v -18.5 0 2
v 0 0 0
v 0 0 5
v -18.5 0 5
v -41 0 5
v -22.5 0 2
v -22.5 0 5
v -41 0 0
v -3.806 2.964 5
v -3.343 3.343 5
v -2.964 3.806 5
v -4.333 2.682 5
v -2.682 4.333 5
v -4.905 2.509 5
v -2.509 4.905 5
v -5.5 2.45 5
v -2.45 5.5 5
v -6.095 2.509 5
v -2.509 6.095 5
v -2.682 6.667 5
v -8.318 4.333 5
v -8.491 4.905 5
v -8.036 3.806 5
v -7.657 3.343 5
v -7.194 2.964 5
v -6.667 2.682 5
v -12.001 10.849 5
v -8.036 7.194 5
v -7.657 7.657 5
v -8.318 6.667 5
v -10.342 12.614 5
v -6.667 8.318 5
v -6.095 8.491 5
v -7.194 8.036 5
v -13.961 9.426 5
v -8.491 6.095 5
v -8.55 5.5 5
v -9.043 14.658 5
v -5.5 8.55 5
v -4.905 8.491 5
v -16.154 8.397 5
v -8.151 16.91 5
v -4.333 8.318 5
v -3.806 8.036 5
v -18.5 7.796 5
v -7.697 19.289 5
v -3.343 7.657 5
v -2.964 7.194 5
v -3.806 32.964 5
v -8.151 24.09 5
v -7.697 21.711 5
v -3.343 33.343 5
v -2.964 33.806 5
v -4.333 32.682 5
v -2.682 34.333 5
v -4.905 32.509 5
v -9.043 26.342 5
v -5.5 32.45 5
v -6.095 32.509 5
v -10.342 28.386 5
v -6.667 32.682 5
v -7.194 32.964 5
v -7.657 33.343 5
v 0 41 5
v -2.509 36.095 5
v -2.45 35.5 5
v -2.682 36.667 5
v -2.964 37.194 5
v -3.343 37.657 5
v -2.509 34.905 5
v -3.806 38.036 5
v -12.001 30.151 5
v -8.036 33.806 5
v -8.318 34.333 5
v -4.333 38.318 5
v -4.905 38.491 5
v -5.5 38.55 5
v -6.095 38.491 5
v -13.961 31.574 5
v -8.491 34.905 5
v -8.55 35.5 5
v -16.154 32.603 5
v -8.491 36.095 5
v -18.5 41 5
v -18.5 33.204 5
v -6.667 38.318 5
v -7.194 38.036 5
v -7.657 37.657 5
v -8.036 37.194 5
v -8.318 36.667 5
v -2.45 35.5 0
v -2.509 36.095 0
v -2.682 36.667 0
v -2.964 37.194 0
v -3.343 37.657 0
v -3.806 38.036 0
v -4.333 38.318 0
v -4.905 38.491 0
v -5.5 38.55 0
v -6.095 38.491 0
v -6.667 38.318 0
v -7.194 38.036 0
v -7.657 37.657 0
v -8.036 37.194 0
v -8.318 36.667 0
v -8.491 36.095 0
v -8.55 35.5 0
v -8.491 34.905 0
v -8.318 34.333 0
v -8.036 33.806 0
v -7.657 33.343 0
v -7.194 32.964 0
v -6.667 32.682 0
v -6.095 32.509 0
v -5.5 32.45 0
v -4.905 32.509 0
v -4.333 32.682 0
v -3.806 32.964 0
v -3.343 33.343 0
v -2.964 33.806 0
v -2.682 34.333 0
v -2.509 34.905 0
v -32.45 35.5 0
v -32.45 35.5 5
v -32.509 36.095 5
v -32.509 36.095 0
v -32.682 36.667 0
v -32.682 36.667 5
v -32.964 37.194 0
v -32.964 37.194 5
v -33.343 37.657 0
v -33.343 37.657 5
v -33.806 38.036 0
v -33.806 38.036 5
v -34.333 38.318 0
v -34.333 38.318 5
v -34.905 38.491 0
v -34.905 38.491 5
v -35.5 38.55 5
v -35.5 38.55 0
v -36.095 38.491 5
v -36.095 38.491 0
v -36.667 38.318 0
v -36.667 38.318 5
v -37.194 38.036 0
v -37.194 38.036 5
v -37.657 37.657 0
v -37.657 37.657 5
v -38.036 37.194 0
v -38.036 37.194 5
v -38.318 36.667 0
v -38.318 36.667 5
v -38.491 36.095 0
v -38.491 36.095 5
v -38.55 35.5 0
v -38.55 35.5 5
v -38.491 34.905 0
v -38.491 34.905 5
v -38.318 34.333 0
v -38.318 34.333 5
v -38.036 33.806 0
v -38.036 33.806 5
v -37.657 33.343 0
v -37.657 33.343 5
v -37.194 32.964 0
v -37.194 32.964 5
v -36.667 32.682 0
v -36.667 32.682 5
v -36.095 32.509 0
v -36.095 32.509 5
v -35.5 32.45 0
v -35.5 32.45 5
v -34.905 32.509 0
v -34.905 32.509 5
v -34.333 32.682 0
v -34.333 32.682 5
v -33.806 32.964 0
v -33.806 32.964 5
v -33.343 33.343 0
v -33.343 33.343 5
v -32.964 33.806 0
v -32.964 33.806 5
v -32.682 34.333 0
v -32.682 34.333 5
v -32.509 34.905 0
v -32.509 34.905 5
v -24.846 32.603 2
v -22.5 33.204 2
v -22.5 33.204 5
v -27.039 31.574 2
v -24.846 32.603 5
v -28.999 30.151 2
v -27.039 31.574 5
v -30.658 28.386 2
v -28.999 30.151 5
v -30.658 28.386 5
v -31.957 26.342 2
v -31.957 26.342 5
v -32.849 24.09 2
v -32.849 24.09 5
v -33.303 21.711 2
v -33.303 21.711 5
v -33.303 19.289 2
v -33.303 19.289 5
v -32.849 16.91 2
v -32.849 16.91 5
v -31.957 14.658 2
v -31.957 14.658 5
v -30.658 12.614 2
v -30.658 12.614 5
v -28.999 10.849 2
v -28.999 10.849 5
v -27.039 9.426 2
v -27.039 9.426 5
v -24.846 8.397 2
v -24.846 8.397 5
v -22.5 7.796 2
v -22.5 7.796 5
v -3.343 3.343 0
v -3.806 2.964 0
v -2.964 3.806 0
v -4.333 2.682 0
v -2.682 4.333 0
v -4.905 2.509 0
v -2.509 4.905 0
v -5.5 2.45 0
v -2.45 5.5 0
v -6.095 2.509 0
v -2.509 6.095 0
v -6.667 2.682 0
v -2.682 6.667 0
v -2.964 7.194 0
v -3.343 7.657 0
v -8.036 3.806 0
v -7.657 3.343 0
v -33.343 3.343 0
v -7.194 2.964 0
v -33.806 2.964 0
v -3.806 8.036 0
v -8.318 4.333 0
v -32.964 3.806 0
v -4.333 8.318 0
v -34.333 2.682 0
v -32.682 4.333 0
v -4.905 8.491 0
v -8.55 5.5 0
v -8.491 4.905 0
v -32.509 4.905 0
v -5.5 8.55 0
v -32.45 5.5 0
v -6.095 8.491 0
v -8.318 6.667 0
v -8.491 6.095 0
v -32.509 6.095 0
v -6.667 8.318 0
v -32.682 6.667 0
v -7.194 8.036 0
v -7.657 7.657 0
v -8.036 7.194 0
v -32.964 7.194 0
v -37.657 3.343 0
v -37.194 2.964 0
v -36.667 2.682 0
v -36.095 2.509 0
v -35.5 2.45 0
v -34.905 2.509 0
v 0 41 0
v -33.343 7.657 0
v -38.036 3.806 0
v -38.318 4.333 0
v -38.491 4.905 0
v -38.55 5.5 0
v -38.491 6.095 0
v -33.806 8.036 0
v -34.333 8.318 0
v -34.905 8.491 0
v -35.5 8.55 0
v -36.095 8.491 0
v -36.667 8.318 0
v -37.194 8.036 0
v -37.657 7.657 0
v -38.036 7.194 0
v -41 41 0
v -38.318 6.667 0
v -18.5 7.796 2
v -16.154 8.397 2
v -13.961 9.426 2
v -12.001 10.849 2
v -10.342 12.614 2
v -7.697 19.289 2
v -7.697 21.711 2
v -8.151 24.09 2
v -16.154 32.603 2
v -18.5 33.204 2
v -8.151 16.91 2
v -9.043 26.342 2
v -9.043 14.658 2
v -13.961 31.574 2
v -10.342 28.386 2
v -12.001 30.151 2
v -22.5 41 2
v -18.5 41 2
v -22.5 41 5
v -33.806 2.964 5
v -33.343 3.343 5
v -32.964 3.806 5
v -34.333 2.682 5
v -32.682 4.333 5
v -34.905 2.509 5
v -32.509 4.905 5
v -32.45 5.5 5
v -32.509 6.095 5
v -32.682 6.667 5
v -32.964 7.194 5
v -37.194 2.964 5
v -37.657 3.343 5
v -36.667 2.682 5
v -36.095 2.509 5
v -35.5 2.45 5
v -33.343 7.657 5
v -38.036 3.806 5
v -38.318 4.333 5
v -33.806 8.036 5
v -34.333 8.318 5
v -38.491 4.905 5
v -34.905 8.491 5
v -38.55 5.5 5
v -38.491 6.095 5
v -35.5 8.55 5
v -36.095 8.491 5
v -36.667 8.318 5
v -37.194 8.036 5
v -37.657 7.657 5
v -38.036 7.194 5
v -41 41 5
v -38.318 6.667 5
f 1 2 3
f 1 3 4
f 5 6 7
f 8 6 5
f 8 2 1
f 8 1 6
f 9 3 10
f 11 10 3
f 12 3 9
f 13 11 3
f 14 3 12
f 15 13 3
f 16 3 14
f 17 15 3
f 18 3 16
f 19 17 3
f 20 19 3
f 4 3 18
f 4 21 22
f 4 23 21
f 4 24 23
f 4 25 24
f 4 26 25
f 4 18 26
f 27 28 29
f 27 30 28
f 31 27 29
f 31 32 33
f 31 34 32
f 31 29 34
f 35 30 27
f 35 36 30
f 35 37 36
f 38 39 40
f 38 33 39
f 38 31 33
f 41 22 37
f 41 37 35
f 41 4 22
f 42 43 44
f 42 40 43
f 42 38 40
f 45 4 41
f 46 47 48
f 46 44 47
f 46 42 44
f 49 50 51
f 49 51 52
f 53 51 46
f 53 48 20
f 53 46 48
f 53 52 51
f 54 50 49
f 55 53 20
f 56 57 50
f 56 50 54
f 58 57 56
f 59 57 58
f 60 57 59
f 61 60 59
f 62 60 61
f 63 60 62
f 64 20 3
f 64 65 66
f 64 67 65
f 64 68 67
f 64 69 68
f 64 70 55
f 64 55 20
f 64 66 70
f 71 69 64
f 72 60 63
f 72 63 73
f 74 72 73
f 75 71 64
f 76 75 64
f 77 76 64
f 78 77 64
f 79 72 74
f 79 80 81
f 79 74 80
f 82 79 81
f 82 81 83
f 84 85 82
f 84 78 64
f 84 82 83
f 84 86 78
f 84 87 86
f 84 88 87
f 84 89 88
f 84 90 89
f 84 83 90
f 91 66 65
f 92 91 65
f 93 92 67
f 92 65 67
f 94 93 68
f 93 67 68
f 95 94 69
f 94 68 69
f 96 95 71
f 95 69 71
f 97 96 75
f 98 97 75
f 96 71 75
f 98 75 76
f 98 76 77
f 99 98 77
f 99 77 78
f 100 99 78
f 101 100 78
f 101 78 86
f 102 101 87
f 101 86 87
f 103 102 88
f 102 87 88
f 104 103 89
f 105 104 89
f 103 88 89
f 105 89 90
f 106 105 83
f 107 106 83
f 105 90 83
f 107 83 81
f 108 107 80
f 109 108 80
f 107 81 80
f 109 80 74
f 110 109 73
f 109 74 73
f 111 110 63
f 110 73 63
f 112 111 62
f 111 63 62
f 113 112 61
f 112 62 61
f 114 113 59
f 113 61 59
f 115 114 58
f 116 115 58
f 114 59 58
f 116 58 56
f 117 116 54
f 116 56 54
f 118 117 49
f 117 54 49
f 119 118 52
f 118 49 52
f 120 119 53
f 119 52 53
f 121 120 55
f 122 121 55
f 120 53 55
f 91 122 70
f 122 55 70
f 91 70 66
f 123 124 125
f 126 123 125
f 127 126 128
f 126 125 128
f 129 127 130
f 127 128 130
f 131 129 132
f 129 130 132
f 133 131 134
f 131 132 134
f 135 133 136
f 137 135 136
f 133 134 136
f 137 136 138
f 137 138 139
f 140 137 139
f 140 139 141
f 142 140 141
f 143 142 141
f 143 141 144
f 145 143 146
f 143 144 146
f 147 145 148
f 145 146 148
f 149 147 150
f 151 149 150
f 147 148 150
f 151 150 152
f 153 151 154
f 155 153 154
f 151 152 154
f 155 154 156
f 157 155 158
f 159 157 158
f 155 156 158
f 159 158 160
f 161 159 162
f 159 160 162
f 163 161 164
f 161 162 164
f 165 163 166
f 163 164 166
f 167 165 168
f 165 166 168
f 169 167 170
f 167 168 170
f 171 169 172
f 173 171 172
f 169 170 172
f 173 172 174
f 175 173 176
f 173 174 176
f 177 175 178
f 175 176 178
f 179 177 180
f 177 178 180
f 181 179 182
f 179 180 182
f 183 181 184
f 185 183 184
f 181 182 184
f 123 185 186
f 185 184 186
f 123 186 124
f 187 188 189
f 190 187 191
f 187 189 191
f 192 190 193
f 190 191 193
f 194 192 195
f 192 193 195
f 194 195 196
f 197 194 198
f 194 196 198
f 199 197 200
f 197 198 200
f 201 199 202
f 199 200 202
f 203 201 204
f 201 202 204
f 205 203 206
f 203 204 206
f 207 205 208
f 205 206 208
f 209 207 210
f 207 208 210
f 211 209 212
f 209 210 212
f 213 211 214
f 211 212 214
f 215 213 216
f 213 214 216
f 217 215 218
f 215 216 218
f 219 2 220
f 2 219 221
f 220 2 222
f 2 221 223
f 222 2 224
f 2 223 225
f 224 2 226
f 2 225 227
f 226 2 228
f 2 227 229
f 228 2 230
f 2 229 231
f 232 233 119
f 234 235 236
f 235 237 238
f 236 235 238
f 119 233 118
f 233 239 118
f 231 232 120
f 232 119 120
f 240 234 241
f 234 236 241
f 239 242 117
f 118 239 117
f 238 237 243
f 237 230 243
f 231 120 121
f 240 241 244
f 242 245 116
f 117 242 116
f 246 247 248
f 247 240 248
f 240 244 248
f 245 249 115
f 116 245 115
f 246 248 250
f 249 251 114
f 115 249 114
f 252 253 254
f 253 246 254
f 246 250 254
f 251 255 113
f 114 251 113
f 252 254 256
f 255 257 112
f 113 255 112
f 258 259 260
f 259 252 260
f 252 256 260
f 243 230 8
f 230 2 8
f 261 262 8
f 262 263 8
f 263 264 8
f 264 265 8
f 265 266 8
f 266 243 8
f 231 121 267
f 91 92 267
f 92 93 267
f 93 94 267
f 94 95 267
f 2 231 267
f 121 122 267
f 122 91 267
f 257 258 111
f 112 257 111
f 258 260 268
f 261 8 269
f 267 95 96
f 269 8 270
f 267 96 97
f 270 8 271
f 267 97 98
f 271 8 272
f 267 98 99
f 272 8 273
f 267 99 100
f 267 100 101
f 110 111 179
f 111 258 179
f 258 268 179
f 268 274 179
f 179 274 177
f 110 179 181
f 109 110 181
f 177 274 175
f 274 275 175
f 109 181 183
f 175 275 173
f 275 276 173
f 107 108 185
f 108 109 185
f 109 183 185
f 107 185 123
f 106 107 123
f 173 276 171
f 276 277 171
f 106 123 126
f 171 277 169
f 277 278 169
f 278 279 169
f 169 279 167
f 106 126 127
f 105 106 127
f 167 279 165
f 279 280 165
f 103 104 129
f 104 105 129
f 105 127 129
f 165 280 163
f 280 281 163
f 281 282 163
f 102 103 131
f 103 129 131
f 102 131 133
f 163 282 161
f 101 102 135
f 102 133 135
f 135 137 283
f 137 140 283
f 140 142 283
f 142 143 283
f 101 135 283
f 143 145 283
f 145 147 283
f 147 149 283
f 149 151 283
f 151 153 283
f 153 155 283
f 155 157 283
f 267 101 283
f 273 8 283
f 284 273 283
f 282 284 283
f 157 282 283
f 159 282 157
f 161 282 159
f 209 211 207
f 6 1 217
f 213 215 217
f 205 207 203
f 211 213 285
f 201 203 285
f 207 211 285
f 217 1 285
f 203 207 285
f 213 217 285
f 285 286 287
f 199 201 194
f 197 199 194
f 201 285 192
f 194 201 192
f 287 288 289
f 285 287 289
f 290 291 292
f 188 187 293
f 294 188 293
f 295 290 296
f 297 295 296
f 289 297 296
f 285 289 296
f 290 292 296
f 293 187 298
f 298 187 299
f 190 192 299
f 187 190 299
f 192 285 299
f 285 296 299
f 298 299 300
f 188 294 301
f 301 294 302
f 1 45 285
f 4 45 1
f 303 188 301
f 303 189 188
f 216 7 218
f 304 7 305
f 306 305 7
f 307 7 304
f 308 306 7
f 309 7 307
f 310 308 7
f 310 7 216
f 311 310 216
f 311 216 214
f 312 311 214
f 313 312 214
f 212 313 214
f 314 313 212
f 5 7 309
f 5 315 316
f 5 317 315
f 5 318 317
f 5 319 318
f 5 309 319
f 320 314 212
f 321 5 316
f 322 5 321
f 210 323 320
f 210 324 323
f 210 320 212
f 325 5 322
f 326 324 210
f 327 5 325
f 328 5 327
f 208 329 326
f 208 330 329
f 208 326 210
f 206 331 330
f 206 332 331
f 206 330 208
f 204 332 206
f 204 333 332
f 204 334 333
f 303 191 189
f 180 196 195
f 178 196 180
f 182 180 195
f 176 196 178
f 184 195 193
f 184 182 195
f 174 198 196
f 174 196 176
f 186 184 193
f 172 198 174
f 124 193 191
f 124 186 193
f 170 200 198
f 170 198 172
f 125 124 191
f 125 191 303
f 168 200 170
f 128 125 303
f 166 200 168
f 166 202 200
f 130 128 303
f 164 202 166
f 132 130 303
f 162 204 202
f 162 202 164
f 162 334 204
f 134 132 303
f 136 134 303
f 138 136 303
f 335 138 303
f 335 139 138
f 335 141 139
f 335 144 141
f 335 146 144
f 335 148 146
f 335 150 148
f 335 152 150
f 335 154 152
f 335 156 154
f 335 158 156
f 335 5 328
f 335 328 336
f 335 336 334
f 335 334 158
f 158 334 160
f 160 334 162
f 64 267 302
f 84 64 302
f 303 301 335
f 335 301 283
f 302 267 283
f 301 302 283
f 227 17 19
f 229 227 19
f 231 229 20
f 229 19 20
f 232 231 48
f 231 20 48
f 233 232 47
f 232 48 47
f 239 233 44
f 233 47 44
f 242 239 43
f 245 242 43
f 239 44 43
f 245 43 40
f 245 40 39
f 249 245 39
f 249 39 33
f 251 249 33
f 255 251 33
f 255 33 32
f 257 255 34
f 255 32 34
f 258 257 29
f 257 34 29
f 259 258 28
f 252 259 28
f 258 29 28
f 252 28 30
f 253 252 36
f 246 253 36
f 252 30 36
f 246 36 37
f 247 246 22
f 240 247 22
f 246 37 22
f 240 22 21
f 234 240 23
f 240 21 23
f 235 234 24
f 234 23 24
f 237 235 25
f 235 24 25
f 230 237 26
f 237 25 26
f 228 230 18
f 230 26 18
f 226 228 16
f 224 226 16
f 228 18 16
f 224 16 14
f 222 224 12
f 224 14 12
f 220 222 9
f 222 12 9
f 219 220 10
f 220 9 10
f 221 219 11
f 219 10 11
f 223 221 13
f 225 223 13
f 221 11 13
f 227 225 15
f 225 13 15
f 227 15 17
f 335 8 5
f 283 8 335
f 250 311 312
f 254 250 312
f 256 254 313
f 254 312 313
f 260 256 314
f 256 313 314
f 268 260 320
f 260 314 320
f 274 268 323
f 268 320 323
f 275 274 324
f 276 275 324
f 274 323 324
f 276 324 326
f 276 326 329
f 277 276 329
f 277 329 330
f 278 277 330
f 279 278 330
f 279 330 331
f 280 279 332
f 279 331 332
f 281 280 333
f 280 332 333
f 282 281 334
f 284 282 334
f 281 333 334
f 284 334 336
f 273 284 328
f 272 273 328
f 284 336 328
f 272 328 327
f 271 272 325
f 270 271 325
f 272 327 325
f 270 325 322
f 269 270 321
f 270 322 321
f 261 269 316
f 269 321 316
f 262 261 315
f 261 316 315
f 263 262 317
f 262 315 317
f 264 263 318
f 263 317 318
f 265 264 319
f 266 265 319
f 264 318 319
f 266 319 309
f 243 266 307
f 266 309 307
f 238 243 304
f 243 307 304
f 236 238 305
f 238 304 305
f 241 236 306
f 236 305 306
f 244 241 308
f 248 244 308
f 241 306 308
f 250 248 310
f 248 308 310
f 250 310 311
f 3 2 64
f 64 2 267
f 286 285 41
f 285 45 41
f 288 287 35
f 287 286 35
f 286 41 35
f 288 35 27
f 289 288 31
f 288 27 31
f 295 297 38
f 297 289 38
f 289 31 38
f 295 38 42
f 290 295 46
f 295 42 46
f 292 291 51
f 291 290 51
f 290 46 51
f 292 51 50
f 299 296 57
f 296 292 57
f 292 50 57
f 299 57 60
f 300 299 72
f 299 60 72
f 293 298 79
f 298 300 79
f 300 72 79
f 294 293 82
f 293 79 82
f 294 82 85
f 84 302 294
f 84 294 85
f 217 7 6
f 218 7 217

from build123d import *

# Parameters (mm, degrees)
CROQUIS1_W             = 41
CROQUIS1_H             = 41
PLAQUEBASE_DEPTH       = 5
CROQUIS2_R             = 12.86
CERCLECENTRAL_DEPTH    = 3
CROQUIS3_R             = 3.05
SUPPORT_DEPTH          = 5
CROQUIS4_W             = 3
CROQUIS4_H             = 2.5
TROUSLAT_DEPTH         = 41
CORTAR_EXTRUIR1_DEPTH  = 0.5
CORTAR_EXTRUIR2_DEPTH  = 0.5
CROQUIS15_W            = 7.727780146
CROQUIS15_H            = 3
CORTAR_EXTRUIR3_DEPTH  = 0.5
CROQUIS16_W            = 7.727780146
CROQUIS16_H            = 3
CORTAR_EXTRUIR4_DEPTH  = 0.5
CROQUIS17_W            = 7.727780146
CROQUIS17_H            = 3
CORTAR_EXTRUIR5_DEPTH  = 0.5
CROQUIS18_W            = 7.727780146
CROQUIS18_H            = 3
CORTAR_EXTRUIR6_DEPTH  = 0.5
CROQUIS19_W            = 0.5
CROQUIS19_H            = 3
CORTAR_EXTRUIR7_DEPTH  = 0.5
CROQUIS20_W            = 0.5
CROQUIS20_H            = 3
CORTAR_EXTRUIR8_DEPTH  = 0.5
CROQUIS21_W            = 0.5
CROQUIS21_H            = 3
CORTAR_EXTRUIR9_DEPTH  = 0.5
CROQUIS22_W            = 0.5
CROQUIS22_H            = 3
CORTAR_EXTRUIR10_DEPTH = 0.5


with BuildPart() as part:
    # Croquis1 → PlaqueBase (new body)
    with BuildSketch(Plane(origin=(0, 0, 0), x_dir=(0, 1, 0), z_dir=(0, 0, 1))):
        with Locations((20.5, 20.5)):
            Rectangle(CROQUIS1_W, CROQUIS1_H)
    extrude(amount=PLAQUEBASE_DEPTH)

    # Croquis2 → CercleCentral (cut)
    with BuildSketch(Plane.XY.offset(5)):
        with Locations((-20.5, 20.5)):
            Circle(CROQUIS2_R)
    extrude(amount=-CERCLECENTRAL_DEPTH, mode=Mode.SUBTRACT)

    # Croquis3 → Support (cut)
    with BuildSketch(Plane.XY.offset(5)):
        with Locations((-35.5, 5.5)):
            Circle(CROQUIS3_R)
        with Locations((-5.5, 5.5)):
            Circle(CROQUIS3_R)
        with Locations((-5.5, 35.5)):
            Circle(CROQUIS3_R)
        with Locations((-35.5, 35.5)):
            Circle(CROQUIS3_R)
    extrude(amount=-SUPPORT_DEPTH, mode=Mode.SUBTRACT)

    # Croquis4 → TrousLat (cut)
    with BuildSketch(Plane(origin=(0, 0, 0), x_dir=(-1, 0, 0), z_dir=(0, -1, 0))):
        with Locations((20.5, -3.75)):
            Rectangle(CROQUIS4_W, CROQUIS4_H)
    extrude(amount=-TROUSLAT_DEPTH, mode=Mode.SUBTRACT)

    # Croquis6 → Cortar-Extruir1 (cut)
    with BuildSketch(Plane.XY.offset(2.5)):
        with BuildLine():
            Line((-19, 33.272219854), (-19, 41))
            Line((-19, 41), (-22, 41))
            Line((-22, 41), (-22, 33.272219854))
            ThreePointArc((-22, 33.272219854), (-20.5, 33.36), (-19, 33.272219854))
        make_face()
    extrude(amount=-CORTAR_EXTRUIR1_DEPTH, mode=Mode.SUBTRACT)

    # Croquis14 → Cortar-Extruir2 (cut)
    with BuildSketch(Plane.XY.offset(2.5)):
        with BuildLine():
            Line((-22, 7.727780146), (-22, 0))
            Line((-22, 0), (-19, 0))
            Line((-19, 0), (-19, 7.727780146))
            ThreePointArc((-19, 7.727780146), (-20.5, 7.64), (-22, 7.727780146))
        make_face()
    extrude(amount=-CORTAR_EXTRUIR2_DEPTH, mode=Mode.SUBTRACT)

    # Croquis15 → Cortar-Extruir3 (cut)
    with BuildSketch(Plane(origin=(-19, 0, 0), x_dir=(0, -1, 0), z_dir=(-1, 0, 0))):
        with Locations((-37.136109927, 3.5)):
            Rectangle(CROQUIS15_W, CROQUIS15_H)
    extrude(amount=-CORTAR_EXTRUIR3_DEPTH, mode=Mode.SUBTRACT)

    # Croquis16 → Cortar-Extruir4 (cut)
    with BuildSketch(Plane(origin=(-19, 0, 0), x_dir=(0, -1, 0), z_dir=(-1, 0, 0))):
        with Locations((-3.863890073, 3.5)):
            Rectangle(CROQUIS16_W, CROQUIS16_H)
    extrude(amount=-CORTAR_EXTRUIR4_DEPTH, mode=Mode.SUBTRACT)

    # Croquis17 → Cortar-Extruir5 (cut)
    with BuildSketch(Plane.YZ.offset(-22)):
        with Locations((3.863890073, 3.5)):
            Rectangle(CROQUIS17_W, CROQUIS17_H)
    extrude(amount=-CORTAR_EXTRUIR5_DEPTH, mode=Mode.SUBTRACT)

    # Croquis18 → Cortar-Extruir6 (cut)
    with BuildSketch(Plane.YZ.offset(-22)):
        with Locations((37.136109927, 3.5)):
            Rectangle(CROQUIS18_W, CROQUIS18_H)
    extrude(amount=-CORTAR_EXTRUIR6_DEPTH, mode=Mode.SUBTRACT)

    # Croquis19 → Cortar-Extruir7 (cut)
    with BuildSketch(Plane.XZ.offset(-7.727780146)):
        with Locations((-22.25, 3.5)):
            Rectangle(CROQUIS19_W, CROQUIS19_H)
    extrude(amount=-CORTAR_EXTRUIR7_DEPTH, mode=Mode.SUBTRACT)

    # Croquis20 → Cortar-Extruir8 (cut)
    with BuildSketch(Plane.XZ.offset(-7.727780146)):
        with Locations((-18.75, 3.5)):
            Rectangle(CROQUIS20_W, CROQUIS20_H)
    extrude(amount=-CORTAR_EXTRUIR8_DEPTH, mode=Mode.SUBTRACT)

    # Croquis21 → Cortar-Extruir9 (cut)
    with BuildSketch(Plane(origin=(0, 33.272219854, 0), x_dir=(-1, 0, 0), z_dir=(0, 1, 0))):
        with Locations((18.75, 3.5)):
            Rectangle(CROQUIS21_W, CROQUIS21_H)
    extrude(amount=-CORTAR_EXTRUIR9_DEPTH, mode=Mode.SUBTRACT)

    # Croquis22 → Cortar-Extruir10 (cut)
    with BuildSketch(Plane(origin=(0, 33.272219854, 0), x_dir=(-1, 0, 0), z_dir=(0, 1, 0))):
        with Locations((22.25, 3.5)):
            Rectangle(CROQUIS22_W, CROQUIS22_H)
    extrude(amount=-CORTAR_EXTRUIR10_DEPTH, mode=Mode.SUBTRACT)


solid = part.part
